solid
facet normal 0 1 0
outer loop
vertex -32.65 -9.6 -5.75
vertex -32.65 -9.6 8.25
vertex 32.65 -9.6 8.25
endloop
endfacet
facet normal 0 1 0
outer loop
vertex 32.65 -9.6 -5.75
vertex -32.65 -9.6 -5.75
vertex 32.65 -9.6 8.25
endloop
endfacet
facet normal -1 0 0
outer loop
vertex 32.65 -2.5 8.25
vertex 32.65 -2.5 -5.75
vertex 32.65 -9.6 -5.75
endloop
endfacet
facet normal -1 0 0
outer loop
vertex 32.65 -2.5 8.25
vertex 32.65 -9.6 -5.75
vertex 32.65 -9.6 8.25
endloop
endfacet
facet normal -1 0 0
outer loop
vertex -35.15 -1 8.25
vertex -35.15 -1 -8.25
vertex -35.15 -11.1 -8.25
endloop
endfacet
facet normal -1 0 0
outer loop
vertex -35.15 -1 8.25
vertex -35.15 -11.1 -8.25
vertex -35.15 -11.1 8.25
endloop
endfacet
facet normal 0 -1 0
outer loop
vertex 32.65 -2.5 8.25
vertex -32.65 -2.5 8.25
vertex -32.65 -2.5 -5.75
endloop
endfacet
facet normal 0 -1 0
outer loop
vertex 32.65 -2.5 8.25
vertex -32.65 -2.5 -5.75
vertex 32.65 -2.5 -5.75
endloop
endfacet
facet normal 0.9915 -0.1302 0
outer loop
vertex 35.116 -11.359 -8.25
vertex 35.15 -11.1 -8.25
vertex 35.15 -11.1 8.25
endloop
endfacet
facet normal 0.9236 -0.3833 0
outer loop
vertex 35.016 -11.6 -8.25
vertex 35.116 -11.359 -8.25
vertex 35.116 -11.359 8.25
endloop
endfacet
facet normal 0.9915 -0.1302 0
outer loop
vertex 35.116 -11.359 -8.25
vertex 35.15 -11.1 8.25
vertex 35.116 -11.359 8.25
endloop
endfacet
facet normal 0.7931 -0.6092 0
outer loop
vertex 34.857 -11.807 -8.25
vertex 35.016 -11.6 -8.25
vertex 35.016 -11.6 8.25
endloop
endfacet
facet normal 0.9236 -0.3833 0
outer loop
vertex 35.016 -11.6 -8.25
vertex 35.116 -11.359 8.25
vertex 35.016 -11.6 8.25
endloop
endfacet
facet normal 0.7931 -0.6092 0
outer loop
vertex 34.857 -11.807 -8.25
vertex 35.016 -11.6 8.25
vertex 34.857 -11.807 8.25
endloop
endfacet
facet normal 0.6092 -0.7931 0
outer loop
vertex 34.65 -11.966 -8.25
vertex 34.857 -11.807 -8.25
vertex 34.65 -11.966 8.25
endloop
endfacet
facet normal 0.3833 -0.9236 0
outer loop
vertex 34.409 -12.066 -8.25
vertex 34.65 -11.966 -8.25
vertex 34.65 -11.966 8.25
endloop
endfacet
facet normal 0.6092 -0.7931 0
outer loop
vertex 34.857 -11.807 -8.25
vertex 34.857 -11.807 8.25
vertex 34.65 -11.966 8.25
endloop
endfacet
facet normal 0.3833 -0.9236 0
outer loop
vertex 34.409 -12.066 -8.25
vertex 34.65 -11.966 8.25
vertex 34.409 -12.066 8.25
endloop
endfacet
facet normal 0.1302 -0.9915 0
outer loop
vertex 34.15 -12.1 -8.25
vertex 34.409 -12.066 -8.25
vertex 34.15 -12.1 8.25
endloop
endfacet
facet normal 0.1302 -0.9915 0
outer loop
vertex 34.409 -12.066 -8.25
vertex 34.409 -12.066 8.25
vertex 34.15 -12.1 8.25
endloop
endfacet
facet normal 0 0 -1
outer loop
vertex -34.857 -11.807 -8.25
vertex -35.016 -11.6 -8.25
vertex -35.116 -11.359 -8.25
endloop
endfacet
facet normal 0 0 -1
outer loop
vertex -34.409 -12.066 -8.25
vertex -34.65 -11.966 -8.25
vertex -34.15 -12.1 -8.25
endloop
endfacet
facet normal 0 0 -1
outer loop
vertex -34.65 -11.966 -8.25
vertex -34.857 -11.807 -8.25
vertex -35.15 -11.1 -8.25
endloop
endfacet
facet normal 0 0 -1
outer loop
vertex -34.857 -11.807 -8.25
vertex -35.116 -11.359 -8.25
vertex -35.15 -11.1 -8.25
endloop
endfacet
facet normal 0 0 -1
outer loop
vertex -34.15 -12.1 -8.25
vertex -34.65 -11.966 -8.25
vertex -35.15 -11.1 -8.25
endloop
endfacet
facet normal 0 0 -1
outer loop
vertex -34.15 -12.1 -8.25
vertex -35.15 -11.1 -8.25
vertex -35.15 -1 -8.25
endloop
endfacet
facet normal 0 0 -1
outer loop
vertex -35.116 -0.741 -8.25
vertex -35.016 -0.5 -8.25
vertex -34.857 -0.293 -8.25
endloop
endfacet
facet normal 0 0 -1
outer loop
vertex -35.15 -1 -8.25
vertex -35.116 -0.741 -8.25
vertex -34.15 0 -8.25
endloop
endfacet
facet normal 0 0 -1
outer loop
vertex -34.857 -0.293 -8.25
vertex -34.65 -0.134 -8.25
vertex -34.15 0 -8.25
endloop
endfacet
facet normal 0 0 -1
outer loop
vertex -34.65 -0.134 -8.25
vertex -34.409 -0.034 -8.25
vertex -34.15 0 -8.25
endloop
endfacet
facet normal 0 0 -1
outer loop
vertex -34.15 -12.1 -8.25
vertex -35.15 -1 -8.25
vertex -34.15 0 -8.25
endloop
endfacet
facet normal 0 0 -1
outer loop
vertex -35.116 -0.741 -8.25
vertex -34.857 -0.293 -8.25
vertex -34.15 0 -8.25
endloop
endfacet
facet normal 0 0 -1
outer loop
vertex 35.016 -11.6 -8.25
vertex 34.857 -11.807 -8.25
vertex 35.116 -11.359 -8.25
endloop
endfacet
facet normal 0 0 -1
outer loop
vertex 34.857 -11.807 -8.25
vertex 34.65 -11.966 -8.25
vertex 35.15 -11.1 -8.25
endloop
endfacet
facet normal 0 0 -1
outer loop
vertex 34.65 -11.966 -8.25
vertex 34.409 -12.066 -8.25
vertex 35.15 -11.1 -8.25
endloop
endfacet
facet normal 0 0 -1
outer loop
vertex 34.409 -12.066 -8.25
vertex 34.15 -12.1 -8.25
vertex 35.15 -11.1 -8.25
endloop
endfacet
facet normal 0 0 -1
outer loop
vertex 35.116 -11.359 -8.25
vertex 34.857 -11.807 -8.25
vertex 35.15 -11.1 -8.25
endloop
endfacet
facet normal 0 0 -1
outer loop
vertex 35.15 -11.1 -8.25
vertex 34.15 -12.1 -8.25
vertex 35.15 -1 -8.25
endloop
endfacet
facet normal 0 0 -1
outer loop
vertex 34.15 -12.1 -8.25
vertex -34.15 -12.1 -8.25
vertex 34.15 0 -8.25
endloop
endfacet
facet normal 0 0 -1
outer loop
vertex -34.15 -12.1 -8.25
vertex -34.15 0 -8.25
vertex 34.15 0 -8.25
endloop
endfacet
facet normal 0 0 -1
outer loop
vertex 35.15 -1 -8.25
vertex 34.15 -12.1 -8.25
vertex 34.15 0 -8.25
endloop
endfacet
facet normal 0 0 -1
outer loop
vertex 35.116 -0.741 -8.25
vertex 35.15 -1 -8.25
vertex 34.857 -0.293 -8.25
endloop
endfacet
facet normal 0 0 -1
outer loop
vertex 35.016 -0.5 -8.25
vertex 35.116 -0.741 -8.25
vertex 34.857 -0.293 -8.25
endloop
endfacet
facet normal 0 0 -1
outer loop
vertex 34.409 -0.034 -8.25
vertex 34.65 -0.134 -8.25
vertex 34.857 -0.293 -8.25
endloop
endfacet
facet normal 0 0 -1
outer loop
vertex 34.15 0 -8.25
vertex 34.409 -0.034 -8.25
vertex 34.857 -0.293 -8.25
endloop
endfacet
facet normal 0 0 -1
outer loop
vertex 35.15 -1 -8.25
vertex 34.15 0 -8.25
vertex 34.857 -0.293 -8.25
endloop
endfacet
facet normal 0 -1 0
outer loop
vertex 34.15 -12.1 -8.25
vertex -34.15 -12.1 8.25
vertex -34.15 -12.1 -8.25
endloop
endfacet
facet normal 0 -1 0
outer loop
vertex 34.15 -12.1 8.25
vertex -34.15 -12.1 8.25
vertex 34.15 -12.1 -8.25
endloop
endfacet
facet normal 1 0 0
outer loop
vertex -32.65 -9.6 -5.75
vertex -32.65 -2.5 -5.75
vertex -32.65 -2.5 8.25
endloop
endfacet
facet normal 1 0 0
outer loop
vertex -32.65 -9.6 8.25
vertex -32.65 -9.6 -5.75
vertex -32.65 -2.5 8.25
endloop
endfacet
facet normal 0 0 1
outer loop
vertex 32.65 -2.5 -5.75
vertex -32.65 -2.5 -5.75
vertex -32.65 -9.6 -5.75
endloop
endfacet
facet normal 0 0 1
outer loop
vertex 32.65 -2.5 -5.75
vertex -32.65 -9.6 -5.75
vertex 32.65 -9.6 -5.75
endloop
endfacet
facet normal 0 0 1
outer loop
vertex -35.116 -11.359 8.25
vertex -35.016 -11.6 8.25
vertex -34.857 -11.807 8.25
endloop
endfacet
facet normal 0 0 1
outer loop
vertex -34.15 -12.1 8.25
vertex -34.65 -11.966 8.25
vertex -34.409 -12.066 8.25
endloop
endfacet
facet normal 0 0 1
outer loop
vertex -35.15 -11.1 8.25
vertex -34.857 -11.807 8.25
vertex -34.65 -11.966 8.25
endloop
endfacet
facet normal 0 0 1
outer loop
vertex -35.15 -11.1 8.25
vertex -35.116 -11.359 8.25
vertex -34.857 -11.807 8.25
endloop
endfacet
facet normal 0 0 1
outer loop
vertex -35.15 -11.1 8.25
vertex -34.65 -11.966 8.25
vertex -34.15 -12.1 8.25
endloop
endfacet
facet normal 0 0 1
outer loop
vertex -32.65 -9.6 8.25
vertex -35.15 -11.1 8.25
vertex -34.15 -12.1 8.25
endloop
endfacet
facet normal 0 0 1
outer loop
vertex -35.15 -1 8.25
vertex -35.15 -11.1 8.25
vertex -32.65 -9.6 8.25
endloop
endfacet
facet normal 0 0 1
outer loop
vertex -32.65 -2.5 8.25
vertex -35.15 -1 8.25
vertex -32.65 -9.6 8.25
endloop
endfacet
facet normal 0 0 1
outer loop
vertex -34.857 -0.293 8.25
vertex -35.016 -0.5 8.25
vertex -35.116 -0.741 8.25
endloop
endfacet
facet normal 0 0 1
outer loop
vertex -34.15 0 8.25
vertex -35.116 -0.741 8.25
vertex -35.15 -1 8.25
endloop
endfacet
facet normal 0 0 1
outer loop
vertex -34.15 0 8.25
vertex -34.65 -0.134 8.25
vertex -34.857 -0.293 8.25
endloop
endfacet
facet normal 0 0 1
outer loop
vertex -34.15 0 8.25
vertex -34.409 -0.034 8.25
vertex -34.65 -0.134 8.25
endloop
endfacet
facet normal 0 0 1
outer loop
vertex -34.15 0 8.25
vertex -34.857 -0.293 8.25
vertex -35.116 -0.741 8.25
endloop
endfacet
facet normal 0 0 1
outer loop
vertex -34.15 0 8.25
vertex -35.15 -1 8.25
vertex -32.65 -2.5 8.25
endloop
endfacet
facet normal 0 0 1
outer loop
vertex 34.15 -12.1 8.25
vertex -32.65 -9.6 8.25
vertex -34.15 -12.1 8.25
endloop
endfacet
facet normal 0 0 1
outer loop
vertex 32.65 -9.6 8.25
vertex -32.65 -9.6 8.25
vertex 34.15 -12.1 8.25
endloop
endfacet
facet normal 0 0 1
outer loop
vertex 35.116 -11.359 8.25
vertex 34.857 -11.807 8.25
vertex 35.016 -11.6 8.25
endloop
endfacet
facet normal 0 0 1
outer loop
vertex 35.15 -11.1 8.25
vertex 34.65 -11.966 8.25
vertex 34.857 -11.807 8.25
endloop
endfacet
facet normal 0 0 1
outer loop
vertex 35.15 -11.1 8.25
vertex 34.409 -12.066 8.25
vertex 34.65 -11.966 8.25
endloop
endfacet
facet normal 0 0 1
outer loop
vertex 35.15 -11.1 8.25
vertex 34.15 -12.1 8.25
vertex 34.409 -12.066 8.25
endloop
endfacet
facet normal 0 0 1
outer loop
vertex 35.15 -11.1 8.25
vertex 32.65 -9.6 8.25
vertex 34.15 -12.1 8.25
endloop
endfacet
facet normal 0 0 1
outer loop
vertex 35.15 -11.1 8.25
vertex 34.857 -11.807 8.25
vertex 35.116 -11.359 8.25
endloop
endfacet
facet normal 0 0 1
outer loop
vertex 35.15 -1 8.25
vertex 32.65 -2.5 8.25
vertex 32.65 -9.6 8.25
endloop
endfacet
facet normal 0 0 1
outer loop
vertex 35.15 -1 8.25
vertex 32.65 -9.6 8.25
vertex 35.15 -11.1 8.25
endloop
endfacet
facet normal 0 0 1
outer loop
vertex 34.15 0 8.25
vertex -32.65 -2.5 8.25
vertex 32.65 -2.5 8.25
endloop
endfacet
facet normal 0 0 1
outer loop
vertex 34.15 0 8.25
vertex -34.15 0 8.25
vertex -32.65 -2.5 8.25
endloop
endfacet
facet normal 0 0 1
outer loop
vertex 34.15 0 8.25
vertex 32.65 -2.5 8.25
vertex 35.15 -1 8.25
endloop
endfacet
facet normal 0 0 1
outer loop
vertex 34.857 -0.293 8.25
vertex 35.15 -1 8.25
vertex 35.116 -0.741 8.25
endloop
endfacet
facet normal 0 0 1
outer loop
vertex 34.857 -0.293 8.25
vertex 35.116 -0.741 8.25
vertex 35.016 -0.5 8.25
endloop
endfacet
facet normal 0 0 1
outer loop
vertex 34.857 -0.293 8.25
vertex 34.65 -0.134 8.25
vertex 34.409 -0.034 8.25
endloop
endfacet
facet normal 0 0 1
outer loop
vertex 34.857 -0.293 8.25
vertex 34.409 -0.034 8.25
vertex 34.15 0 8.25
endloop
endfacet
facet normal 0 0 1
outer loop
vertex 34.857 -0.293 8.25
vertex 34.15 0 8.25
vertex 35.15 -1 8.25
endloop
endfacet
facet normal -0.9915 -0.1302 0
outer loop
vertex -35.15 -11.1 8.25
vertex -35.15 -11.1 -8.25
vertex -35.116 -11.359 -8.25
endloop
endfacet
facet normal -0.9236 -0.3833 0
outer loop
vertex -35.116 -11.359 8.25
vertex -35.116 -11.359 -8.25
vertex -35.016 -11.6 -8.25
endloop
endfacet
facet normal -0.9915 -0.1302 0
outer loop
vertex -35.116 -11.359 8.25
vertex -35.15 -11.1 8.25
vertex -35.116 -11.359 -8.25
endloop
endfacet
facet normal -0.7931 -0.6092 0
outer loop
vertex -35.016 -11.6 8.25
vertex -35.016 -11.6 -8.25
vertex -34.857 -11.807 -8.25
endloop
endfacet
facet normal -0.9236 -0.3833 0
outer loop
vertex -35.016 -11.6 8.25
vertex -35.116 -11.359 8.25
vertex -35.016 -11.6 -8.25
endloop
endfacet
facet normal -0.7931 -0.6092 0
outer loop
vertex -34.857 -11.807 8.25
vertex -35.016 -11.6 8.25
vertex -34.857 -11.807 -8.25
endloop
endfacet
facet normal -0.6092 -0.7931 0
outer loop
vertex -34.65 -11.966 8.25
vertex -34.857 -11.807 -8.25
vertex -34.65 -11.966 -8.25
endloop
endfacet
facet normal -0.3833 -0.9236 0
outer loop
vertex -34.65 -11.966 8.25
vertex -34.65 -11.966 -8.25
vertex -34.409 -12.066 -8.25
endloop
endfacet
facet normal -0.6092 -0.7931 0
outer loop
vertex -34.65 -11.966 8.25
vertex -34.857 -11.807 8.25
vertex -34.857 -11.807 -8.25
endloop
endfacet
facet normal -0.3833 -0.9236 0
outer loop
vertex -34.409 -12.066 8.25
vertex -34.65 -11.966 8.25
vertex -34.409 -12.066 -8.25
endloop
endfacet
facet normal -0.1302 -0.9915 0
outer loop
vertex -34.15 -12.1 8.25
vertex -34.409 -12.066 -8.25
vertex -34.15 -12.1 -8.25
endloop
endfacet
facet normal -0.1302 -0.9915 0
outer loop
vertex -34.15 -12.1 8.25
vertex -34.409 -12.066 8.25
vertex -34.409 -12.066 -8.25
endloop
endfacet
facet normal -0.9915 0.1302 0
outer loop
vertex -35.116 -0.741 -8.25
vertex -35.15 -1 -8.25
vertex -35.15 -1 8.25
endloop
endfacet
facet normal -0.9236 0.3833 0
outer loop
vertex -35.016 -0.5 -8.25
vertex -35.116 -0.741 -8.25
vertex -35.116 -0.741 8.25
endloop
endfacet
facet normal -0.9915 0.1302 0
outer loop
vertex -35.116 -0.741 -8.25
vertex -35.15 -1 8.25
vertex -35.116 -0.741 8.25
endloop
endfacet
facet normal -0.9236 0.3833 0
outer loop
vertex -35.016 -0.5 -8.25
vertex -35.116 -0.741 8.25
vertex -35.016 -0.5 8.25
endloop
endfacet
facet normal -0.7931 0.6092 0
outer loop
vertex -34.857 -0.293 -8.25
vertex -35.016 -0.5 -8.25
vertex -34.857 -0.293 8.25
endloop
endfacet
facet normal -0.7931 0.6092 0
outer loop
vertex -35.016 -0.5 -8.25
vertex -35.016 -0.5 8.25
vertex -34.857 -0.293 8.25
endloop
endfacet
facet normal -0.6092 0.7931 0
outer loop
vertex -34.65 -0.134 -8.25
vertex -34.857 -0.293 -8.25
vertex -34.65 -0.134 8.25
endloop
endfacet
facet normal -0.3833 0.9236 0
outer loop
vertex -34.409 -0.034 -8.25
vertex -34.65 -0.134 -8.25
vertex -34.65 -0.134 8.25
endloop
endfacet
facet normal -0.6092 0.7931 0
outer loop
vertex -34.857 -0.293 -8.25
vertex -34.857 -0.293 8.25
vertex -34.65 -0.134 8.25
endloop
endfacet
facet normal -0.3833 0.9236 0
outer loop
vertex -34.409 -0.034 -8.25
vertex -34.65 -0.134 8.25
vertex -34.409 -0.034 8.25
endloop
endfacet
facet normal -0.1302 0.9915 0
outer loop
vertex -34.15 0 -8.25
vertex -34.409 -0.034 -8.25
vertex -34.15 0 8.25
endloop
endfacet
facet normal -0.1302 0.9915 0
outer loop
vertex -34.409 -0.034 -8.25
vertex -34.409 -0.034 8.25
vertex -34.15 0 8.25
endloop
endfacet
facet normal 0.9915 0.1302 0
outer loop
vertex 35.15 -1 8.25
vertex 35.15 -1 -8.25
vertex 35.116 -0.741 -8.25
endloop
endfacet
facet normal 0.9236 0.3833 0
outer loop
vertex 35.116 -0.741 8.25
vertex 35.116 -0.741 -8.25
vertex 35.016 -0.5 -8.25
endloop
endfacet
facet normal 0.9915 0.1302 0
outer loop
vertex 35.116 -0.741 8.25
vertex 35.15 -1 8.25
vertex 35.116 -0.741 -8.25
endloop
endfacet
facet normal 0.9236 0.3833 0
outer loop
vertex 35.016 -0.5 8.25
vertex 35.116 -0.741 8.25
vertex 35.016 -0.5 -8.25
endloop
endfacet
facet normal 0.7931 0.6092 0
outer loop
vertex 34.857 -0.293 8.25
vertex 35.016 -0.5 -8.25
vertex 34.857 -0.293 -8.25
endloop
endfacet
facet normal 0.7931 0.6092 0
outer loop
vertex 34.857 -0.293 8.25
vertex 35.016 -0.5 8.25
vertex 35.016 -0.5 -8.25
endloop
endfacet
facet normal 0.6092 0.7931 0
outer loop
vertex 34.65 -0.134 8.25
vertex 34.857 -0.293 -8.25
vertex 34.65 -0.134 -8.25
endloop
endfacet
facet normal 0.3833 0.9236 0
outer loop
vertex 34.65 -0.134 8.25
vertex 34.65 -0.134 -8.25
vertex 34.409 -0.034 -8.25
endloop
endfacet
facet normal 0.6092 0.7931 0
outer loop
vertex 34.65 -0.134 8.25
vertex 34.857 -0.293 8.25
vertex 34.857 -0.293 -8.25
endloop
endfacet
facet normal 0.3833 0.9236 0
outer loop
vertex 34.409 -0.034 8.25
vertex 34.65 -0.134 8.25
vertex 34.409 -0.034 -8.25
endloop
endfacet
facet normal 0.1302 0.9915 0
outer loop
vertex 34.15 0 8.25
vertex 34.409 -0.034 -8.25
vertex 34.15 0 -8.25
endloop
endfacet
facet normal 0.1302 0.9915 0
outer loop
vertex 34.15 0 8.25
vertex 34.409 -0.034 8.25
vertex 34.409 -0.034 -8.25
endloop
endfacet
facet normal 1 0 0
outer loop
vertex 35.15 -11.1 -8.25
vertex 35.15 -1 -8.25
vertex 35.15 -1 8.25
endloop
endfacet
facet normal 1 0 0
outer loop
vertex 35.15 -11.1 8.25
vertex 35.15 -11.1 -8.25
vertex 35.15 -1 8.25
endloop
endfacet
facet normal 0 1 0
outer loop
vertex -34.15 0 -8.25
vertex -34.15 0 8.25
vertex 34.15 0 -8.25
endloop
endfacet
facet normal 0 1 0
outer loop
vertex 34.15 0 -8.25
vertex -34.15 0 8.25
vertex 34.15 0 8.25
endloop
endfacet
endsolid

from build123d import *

# Parameters (mm, degrees)
F0_W     = 70.3
F0_H     = 16.5
F1_DEPTH = 12.1
F2_T     = -2.5
F3_R     = 1


with BuildPart() as f1:
    # F0 (on Front) → F1 (new body)
    with BuildSketch(Plane.XZ):
        Rectangle(F0_W, F0_H)
    extrude(amount=F1_DEPTH)

    # F2
    f2_openings = [f1.faces().sort_by_distance(p)[0] for p in [
        (0, -6.05, 8.25),
    ]]
    offset(amount=F2_T, openings=f2_openings)

    # F3
    f3_edges = [f1.edges().sort_by_distance(p)[0] for p in [
        (-35.15, -12.1, 0),
        (35.15, -12.1, 0),
        (35.15, 0, 0),
        (-35.15, 0, 0),
    ]]
    fillet(f3_edges, radius=F3_R)


solid = f1.part
